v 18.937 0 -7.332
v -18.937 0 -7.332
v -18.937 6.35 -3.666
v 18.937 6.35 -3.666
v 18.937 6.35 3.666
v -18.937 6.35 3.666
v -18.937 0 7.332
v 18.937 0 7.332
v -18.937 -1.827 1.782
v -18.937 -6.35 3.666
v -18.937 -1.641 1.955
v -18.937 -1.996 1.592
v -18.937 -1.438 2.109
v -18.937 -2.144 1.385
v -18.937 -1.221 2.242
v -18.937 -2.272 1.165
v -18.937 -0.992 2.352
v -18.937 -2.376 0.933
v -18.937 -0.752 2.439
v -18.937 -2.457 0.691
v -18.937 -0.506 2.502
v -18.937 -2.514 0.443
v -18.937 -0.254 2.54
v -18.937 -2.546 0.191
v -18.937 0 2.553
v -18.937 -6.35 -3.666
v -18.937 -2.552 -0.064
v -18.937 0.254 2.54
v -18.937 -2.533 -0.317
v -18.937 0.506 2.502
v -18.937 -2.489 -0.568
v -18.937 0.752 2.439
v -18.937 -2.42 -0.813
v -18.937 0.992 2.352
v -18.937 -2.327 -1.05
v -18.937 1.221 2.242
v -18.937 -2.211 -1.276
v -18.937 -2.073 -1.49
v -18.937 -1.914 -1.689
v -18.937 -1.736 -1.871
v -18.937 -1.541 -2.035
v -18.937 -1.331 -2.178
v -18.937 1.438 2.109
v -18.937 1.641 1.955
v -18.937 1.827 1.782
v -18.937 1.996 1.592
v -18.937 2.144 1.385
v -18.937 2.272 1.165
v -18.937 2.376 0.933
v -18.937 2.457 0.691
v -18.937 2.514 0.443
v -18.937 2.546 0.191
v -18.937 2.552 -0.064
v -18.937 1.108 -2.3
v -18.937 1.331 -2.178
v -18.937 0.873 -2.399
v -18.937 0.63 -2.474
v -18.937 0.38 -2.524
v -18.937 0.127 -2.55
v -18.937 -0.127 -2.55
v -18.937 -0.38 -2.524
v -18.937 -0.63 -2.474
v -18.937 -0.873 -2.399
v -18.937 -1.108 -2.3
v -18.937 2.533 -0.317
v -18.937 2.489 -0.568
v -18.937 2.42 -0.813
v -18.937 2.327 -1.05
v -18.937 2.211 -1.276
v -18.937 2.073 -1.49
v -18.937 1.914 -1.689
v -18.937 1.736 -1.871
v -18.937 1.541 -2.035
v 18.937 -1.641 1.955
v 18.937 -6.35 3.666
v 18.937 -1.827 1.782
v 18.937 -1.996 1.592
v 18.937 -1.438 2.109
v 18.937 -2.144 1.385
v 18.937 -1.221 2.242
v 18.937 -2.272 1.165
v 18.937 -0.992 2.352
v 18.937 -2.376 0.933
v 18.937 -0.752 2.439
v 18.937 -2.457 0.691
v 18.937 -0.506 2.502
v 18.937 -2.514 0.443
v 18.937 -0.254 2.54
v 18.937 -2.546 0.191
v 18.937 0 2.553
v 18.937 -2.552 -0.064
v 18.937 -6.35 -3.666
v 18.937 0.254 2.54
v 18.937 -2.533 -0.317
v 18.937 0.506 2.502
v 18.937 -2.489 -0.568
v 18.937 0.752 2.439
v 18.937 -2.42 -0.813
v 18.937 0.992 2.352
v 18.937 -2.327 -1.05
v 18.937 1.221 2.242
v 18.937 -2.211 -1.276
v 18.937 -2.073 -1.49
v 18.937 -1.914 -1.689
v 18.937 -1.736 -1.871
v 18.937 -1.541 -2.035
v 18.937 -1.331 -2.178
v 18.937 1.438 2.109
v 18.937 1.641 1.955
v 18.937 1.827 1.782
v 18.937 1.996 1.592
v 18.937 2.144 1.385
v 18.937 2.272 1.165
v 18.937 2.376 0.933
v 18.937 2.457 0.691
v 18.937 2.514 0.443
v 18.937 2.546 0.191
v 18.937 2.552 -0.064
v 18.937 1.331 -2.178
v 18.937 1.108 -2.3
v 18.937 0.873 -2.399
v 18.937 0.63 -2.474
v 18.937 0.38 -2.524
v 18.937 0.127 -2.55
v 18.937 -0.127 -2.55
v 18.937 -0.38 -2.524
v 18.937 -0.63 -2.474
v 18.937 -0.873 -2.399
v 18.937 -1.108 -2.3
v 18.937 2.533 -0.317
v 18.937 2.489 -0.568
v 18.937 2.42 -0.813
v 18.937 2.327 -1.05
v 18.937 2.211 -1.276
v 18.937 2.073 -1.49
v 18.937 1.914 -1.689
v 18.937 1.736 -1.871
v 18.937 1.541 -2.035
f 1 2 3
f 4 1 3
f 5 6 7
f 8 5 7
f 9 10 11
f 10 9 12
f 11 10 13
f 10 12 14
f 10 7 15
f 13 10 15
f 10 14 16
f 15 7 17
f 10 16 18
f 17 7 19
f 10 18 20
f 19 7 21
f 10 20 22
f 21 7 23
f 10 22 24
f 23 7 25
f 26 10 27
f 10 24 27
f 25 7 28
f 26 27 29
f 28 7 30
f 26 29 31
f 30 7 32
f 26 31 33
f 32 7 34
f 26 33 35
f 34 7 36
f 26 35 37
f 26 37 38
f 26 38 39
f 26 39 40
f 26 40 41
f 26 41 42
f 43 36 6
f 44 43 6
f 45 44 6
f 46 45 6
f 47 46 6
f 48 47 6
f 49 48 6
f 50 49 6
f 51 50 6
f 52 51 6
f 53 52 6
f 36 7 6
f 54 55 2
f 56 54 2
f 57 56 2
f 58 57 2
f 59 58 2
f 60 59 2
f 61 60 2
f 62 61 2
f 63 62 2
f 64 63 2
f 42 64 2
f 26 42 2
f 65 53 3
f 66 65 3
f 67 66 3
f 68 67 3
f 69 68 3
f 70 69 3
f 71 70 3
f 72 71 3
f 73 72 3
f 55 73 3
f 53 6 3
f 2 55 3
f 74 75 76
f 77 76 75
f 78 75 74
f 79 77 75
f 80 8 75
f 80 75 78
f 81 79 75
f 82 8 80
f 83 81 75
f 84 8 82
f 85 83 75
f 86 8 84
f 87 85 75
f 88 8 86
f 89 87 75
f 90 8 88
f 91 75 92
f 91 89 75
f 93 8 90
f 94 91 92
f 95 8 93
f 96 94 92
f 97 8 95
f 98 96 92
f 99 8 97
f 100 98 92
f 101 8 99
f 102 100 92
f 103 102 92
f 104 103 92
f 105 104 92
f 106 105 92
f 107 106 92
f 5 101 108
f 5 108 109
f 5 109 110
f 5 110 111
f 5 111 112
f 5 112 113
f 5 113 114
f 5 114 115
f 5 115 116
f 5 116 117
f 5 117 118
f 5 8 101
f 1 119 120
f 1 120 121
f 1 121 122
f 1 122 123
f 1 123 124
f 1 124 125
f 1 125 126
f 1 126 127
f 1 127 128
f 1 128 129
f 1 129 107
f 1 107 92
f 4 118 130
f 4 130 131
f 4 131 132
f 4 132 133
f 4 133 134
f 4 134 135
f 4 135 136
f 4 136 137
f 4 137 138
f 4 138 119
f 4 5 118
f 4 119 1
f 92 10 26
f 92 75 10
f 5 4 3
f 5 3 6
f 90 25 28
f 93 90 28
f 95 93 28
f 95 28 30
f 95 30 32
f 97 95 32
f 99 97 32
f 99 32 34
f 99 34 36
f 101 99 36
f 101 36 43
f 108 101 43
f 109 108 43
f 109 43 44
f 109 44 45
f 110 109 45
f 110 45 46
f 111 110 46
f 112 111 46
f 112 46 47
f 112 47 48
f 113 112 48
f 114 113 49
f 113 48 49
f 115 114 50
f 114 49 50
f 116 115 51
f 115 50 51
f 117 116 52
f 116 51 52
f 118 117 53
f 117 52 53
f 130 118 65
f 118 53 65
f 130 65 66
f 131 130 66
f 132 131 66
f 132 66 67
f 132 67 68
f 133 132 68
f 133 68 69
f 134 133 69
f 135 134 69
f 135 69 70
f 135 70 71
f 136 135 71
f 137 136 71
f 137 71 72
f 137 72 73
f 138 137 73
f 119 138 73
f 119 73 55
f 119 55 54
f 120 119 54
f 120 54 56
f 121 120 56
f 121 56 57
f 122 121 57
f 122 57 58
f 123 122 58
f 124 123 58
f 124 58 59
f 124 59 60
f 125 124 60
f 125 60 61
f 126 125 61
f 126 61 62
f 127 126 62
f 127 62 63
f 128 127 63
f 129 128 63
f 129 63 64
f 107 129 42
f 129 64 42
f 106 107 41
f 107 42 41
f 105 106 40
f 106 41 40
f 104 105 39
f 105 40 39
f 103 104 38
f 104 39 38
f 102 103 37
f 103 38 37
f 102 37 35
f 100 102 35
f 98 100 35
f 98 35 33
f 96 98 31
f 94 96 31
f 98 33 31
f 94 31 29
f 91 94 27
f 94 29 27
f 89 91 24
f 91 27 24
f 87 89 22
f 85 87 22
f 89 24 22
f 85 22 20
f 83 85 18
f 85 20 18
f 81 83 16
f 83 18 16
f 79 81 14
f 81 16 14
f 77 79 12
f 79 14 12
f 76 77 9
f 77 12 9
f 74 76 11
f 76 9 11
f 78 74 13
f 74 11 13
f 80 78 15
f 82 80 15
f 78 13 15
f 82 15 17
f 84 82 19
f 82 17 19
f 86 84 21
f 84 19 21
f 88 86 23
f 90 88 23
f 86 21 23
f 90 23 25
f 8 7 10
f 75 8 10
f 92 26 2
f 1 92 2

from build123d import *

# Parameters (mm, degrees)
BOSS_EXTRUDE1_DEPTH     = 18.937499939
F_1_4_20_TAPPED_HOLE1_D = 5.1054


with BuildPart() as part:
    # Sketch1 → Boss-Extrude1 (new, symmetric)
    with BuildSketch(Plane(origin=(0, 0, 0), x_dir=(0, 0, -1), z_dir=(1, 0, 0))):
        Polygon((7.332348419, 0), (3.666174209, 6.35), (-3.666174209, 6.35), (-7.332348419, 0), (-3.666174209, -6.35), (3.666174209, -6.35), align=None)
    extrude(amount=BOSS_EXTRUDE1_DEPTH, both=True)

    # 1/4-20 Tapped Hole1 (through all)
    with Locations(Plane(origin=(18.937499939, 0, 0), x_dir=(0, 0, -1), z_dir=(1, 0, 0))):
        with Locations((0, 0)):
            Hole(F_1_4_20_TAPPED_HOLE1_D / 2)


solid = part.part
